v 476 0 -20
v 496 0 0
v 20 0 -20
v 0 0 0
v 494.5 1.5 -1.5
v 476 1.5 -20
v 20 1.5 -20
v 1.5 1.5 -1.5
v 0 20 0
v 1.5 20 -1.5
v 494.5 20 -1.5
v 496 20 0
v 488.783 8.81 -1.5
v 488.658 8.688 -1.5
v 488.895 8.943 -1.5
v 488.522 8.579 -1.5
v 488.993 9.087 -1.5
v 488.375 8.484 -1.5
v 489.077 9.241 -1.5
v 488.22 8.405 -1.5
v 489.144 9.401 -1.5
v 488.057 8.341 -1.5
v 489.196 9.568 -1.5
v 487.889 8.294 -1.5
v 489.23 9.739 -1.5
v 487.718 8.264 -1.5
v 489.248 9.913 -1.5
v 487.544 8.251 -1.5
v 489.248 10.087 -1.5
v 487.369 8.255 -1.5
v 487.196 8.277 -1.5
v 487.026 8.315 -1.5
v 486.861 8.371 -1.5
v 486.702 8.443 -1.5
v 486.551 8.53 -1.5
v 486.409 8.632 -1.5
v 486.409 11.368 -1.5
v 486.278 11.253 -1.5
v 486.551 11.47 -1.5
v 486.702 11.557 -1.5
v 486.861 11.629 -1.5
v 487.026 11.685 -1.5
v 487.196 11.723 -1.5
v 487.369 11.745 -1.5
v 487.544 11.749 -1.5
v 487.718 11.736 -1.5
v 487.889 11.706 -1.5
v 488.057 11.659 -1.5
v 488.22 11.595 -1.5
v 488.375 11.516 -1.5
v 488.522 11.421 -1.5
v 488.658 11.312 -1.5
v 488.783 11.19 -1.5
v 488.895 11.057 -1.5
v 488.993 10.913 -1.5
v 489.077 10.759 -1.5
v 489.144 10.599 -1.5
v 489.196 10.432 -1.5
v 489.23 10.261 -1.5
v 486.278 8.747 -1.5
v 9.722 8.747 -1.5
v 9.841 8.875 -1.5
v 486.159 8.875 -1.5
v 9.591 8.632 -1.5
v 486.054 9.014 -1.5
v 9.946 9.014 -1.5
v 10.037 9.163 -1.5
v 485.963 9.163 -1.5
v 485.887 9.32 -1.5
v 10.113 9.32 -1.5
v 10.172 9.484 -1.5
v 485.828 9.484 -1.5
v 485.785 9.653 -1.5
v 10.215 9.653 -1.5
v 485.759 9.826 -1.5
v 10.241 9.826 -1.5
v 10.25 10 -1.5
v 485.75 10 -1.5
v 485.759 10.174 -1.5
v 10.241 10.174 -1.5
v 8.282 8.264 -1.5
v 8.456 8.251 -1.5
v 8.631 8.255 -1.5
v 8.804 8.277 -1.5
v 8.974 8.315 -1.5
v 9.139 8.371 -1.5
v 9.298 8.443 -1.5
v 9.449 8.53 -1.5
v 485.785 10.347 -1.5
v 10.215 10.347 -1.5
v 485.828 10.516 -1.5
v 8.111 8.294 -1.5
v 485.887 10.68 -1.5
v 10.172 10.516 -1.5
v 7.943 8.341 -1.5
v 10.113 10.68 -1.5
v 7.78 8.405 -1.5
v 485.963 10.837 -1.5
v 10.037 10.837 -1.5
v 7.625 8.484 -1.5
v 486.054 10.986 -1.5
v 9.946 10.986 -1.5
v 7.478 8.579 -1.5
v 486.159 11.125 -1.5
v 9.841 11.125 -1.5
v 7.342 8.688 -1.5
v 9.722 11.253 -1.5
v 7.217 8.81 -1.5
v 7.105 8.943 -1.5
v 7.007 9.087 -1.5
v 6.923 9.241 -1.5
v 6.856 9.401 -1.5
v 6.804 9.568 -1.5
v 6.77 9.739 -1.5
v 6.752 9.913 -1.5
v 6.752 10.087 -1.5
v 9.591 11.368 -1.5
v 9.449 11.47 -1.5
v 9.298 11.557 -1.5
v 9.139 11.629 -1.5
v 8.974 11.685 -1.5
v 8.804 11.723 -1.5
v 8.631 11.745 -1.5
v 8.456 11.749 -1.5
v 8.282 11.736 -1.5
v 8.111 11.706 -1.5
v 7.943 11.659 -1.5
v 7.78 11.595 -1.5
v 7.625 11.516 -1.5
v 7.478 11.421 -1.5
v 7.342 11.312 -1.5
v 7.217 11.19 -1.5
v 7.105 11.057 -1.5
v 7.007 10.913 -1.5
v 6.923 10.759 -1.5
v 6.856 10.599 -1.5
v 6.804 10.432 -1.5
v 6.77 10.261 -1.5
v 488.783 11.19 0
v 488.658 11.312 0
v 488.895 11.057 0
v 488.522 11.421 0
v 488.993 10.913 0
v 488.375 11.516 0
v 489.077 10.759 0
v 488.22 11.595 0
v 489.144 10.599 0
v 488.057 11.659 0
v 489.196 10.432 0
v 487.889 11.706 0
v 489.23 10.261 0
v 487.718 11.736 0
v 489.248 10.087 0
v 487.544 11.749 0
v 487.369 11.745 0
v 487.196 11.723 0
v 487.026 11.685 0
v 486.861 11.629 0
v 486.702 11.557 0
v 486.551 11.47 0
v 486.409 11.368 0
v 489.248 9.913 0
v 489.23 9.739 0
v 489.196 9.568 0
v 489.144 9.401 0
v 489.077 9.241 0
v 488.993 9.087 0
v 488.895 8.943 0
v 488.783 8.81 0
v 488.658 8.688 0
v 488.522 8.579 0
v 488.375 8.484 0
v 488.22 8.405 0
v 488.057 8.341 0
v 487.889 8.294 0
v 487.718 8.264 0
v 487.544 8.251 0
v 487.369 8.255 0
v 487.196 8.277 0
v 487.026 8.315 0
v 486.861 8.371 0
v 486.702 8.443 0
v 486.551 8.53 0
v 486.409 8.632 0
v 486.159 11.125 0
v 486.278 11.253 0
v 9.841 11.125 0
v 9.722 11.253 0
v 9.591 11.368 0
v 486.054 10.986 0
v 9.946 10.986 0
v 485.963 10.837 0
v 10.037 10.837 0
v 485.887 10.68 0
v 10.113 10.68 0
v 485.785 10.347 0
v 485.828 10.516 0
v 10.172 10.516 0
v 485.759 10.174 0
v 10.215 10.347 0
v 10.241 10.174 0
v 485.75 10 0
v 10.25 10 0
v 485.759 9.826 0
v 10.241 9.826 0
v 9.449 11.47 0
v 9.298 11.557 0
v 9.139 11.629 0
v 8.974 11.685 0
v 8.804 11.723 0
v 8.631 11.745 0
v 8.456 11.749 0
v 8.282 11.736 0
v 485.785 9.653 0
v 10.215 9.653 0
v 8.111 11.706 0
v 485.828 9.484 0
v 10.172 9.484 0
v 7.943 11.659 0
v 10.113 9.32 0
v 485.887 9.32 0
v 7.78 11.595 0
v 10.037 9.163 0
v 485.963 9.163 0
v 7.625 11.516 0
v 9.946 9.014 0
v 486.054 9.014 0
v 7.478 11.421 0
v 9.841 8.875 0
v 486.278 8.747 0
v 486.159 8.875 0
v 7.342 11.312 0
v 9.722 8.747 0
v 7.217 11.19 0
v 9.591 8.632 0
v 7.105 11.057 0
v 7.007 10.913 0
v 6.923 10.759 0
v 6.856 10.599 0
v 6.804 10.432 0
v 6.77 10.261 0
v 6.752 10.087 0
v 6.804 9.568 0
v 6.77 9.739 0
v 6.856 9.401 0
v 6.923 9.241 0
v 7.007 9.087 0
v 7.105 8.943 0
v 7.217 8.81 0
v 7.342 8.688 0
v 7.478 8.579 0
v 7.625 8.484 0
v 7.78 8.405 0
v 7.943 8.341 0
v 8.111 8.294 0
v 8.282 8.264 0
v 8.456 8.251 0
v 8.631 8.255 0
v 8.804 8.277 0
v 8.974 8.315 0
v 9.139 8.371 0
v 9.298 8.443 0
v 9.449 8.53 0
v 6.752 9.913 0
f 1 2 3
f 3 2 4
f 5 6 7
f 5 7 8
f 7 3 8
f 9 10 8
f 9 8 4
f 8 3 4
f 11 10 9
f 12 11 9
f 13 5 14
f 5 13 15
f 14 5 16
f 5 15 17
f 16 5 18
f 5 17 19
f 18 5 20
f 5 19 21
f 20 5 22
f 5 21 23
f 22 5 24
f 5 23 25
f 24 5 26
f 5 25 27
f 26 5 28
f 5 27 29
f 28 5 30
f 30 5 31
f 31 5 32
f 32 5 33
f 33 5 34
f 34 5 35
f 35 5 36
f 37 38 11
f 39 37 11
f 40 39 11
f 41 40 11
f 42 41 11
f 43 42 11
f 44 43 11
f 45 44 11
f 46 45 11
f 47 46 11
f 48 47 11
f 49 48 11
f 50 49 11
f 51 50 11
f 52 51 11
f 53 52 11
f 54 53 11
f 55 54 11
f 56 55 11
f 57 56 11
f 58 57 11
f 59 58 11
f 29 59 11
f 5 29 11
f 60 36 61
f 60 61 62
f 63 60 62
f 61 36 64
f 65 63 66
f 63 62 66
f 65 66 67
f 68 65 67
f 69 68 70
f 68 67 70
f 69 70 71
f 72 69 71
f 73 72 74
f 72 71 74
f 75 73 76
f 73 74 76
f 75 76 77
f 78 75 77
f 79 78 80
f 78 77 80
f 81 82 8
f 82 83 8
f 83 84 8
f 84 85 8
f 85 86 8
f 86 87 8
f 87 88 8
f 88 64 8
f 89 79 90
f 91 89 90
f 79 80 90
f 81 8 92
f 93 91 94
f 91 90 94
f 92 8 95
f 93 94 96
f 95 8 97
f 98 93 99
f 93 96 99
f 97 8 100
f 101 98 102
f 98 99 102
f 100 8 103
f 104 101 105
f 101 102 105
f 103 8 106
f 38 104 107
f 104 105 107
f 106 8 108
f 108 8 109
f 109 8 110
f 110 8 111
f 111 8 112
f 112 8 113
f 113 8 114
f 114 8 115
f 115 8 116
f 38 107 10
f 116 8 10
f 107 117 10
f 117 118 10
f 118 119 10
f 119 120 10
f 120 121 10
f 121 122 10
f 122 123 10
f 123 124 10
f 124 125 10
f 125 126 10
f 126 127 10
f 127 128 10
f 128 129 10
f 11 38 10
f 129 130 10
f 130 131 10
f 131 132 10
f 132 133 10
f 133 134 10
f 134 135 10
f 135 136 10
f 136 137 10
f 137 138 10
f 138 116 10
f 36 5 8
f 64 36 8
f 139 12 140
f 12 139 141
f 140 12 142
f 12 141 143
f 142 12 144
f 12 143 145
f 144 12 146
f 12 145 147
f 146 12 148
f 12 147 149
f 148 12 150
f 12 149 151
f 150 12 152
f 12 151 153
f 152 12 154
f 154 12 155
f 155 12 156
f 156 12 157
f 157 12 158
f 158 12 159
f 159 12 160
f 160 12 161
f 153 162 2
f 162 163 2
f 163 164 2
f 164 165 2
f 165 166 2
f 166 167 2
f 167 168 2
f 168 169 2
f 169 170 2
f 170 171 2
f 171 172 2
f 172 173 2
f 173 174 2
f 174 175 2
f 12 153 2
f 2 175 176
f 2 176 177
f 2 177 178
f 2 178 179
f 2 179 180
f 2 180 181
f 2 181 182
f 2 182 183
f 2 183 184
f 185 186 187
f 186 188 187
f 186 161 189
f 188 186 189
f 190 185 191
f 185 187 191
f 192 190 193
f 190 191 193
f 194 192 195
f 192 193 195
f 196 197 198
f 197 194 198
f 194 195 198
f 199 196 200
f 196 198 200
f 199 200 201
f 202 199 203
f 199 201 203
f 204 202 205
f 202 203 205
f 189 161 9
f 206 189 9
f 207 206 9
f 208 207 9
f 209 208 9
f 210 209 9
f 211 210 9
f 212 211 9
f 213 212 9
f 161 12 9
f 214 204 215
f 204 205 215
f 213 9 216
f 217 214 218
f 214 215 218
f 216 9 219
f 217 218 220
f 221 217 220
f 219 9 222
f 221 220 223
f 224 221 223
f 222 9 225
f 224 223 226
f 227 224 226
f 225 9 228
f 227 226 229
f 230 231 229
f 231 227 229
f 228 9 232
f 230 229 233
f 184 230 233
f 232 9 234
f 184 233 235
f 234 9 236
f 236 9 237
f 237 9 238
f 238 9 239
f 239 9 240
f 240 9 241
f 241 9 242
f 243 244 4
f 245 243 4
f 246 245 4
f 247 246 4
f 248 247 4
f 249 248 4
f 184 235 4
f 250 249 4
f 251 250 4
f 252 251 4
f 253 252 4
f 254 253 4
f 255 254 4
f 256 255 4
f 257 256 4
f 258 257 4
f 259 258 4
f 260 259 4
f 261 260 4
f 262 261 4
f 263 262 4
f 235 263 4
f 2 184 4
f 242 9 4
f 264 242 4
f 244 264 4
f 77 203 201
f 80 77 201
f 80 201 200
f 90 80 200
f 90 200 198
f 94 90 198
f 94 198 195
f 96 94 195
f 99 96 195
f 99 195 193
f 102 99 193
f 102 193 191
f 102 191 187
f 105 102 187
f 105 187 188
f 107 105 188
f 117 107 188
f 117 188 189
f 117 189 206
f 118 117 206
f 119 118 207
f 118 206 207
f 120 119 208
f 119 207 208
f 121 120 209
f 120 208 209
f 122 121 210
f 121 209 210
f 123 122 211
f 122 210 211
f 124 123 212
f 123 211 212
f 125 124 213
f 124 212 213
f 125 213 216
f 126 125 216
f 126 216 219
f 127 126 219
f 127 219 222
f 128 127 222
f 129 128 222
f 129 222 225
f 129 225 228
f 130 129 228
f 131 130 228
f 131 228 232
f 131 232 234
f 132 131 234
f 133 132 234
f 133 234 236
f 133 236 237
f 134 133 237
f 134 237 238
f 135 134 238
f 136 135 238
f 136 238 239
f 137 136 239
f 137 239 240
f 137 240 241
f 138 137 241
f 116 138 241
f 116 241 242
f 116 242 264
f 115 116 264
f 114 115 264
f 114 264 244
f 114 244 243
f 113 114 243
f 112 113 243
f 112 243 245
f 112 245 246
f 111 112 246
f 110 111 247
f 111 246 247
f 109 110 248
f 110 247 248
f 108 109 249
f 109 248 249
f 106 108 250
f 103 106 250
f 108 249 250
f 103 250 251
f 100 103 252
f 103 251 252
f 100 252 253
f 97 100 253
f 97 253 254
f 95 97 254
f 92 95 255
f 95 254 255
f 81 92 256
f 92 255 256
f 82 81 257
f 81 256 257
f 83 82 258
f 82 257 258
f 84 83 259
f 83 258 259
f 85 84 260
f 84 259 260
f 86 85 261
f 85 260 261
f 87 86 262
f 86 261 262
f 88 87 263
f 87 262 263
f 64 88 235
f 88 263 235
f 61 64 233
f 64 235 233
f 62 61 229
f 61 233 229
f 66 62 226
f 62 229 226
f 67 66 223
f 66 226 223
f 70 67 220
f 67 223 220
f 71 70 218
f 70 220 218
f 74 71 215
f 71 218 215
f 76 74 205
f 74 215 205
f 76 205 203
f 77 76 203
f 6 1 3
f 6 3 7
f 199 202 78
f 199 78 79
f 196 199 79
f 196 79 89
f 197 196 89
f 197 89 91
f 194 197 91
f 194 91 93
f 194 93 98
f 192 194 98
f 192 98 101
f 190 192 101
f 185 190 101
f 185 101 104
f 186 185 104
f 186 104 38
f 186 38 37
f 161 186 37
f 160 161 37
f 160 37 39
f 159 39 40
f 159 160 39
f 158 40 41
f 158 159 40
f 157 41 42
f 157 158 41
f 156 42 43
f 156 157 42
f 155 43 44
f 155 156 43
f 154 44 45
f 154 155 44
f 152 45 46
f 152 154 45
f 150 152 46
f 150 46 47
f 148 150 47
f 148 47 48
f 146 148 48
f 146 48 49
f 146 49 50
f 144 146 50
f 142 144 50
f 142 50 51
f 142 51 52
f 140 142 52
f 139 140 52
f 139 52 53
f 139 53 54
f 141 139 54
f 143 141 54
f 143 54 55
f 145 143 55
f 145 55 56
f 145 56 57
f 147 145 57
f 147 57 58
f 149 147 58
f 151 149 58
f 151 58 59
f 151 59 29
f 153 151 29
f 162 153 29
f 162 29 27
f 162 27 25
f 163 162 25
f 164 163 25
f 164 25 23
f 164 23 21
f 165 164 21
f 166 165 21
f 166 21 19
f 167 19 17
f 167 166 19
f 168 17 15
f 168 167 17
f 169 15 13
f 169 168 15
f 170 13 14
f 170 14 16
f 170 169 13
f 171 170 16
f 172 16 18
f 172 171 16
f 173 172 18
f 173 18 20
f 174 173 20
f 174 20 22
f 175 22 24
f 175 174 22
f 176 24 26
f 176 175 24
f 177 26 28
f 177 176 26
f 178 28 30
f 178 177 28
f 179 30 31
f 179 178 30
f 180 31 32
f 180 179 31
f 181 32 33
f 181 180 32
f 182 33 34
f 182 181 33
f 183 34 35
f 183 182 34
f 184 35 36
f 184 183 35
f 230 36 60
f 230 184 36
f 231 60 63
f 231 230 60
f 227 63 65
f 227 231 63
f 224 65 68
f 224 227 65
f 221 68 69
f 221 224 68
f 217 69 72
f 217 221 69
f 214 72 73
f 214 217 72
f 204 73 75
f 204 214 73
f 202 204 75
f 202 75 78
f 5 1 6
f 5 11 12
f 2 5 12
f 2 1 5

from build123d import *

# Parameters (mm, degrees)
EXTRUDE_1_DEPTH     = 496
CUT_EXTRUDE_1_DEPTH = 497.805797068
CUT_EXTRUDE_2_REACH = 498.806
SKETCH_3_R          = 1.75


with BuildPart() as part:
    # Эскиз1 → Бобышка-Вытянуть1 (new body)
    with BuildSketch(Plane(origin=(0, 0, 0), x_dir=(0, 0, -1), z_dir=(1, 0, 0))):
        Polygon((0, 0), (20, 0), (20, 1.5), (1.5, 1.5), (1.5, 20), (0, 20), align=None)
    extrude(amount=EXTRUDE_1_DEPTH)

    # Эскиз2 → Вырез-Вытянуть1 (cut, through all)
    with BuildSketch(Plane.XZ):
        Polygon((0, 0), (0, -20), (20, -20), align=None)
    cut_extrude_1 = extrude(amount=-CUT_EXTRUDE_1_DEPTH, mode=Mode.SUBTRACT)

    # Эскиз3 → Вырез-Вытянуть2 (cut, up to next)
    with BuildSketch(Plane.XY, mode=Mode.PRIVATE) as cut_extrude_2_sk1:
        with Locations((8.5, 10)):
            Circle(SKETCH_3_R)
    cut_extrude_2_tool1 = extrude(cut_extrude_2_sk1.sketch, amount=-CUT_EXTRUDE_2_REACH, mode=Mode.PRIVATE) & part.part
    cut_extrude_2 = cut_extrude_2_tool1.solids().sort_by_distance((8.5, 10, 0))[0]
    add(cut_extrude_2, mode=Mode.SUBTRACT)

    # Зеркальное отражение1: Вырез-Вытянуть1, Вырез-Вытянуть2 across plane
    add(cut_extrude_1.mirror(Plane(origin=(248, 0, 0), x_dir=(0, 0, 1), z_dir=(1, 0, 0))), mode=Mode.SUBTRACT)
    add(cut_extrude_2.mirror(Plane(origin=(248, 0, 0), x_dir=(0, 0, 1), z_dir=(1, 0, 0))), mode=Mode.SUBTRACT)


solid = part.part
